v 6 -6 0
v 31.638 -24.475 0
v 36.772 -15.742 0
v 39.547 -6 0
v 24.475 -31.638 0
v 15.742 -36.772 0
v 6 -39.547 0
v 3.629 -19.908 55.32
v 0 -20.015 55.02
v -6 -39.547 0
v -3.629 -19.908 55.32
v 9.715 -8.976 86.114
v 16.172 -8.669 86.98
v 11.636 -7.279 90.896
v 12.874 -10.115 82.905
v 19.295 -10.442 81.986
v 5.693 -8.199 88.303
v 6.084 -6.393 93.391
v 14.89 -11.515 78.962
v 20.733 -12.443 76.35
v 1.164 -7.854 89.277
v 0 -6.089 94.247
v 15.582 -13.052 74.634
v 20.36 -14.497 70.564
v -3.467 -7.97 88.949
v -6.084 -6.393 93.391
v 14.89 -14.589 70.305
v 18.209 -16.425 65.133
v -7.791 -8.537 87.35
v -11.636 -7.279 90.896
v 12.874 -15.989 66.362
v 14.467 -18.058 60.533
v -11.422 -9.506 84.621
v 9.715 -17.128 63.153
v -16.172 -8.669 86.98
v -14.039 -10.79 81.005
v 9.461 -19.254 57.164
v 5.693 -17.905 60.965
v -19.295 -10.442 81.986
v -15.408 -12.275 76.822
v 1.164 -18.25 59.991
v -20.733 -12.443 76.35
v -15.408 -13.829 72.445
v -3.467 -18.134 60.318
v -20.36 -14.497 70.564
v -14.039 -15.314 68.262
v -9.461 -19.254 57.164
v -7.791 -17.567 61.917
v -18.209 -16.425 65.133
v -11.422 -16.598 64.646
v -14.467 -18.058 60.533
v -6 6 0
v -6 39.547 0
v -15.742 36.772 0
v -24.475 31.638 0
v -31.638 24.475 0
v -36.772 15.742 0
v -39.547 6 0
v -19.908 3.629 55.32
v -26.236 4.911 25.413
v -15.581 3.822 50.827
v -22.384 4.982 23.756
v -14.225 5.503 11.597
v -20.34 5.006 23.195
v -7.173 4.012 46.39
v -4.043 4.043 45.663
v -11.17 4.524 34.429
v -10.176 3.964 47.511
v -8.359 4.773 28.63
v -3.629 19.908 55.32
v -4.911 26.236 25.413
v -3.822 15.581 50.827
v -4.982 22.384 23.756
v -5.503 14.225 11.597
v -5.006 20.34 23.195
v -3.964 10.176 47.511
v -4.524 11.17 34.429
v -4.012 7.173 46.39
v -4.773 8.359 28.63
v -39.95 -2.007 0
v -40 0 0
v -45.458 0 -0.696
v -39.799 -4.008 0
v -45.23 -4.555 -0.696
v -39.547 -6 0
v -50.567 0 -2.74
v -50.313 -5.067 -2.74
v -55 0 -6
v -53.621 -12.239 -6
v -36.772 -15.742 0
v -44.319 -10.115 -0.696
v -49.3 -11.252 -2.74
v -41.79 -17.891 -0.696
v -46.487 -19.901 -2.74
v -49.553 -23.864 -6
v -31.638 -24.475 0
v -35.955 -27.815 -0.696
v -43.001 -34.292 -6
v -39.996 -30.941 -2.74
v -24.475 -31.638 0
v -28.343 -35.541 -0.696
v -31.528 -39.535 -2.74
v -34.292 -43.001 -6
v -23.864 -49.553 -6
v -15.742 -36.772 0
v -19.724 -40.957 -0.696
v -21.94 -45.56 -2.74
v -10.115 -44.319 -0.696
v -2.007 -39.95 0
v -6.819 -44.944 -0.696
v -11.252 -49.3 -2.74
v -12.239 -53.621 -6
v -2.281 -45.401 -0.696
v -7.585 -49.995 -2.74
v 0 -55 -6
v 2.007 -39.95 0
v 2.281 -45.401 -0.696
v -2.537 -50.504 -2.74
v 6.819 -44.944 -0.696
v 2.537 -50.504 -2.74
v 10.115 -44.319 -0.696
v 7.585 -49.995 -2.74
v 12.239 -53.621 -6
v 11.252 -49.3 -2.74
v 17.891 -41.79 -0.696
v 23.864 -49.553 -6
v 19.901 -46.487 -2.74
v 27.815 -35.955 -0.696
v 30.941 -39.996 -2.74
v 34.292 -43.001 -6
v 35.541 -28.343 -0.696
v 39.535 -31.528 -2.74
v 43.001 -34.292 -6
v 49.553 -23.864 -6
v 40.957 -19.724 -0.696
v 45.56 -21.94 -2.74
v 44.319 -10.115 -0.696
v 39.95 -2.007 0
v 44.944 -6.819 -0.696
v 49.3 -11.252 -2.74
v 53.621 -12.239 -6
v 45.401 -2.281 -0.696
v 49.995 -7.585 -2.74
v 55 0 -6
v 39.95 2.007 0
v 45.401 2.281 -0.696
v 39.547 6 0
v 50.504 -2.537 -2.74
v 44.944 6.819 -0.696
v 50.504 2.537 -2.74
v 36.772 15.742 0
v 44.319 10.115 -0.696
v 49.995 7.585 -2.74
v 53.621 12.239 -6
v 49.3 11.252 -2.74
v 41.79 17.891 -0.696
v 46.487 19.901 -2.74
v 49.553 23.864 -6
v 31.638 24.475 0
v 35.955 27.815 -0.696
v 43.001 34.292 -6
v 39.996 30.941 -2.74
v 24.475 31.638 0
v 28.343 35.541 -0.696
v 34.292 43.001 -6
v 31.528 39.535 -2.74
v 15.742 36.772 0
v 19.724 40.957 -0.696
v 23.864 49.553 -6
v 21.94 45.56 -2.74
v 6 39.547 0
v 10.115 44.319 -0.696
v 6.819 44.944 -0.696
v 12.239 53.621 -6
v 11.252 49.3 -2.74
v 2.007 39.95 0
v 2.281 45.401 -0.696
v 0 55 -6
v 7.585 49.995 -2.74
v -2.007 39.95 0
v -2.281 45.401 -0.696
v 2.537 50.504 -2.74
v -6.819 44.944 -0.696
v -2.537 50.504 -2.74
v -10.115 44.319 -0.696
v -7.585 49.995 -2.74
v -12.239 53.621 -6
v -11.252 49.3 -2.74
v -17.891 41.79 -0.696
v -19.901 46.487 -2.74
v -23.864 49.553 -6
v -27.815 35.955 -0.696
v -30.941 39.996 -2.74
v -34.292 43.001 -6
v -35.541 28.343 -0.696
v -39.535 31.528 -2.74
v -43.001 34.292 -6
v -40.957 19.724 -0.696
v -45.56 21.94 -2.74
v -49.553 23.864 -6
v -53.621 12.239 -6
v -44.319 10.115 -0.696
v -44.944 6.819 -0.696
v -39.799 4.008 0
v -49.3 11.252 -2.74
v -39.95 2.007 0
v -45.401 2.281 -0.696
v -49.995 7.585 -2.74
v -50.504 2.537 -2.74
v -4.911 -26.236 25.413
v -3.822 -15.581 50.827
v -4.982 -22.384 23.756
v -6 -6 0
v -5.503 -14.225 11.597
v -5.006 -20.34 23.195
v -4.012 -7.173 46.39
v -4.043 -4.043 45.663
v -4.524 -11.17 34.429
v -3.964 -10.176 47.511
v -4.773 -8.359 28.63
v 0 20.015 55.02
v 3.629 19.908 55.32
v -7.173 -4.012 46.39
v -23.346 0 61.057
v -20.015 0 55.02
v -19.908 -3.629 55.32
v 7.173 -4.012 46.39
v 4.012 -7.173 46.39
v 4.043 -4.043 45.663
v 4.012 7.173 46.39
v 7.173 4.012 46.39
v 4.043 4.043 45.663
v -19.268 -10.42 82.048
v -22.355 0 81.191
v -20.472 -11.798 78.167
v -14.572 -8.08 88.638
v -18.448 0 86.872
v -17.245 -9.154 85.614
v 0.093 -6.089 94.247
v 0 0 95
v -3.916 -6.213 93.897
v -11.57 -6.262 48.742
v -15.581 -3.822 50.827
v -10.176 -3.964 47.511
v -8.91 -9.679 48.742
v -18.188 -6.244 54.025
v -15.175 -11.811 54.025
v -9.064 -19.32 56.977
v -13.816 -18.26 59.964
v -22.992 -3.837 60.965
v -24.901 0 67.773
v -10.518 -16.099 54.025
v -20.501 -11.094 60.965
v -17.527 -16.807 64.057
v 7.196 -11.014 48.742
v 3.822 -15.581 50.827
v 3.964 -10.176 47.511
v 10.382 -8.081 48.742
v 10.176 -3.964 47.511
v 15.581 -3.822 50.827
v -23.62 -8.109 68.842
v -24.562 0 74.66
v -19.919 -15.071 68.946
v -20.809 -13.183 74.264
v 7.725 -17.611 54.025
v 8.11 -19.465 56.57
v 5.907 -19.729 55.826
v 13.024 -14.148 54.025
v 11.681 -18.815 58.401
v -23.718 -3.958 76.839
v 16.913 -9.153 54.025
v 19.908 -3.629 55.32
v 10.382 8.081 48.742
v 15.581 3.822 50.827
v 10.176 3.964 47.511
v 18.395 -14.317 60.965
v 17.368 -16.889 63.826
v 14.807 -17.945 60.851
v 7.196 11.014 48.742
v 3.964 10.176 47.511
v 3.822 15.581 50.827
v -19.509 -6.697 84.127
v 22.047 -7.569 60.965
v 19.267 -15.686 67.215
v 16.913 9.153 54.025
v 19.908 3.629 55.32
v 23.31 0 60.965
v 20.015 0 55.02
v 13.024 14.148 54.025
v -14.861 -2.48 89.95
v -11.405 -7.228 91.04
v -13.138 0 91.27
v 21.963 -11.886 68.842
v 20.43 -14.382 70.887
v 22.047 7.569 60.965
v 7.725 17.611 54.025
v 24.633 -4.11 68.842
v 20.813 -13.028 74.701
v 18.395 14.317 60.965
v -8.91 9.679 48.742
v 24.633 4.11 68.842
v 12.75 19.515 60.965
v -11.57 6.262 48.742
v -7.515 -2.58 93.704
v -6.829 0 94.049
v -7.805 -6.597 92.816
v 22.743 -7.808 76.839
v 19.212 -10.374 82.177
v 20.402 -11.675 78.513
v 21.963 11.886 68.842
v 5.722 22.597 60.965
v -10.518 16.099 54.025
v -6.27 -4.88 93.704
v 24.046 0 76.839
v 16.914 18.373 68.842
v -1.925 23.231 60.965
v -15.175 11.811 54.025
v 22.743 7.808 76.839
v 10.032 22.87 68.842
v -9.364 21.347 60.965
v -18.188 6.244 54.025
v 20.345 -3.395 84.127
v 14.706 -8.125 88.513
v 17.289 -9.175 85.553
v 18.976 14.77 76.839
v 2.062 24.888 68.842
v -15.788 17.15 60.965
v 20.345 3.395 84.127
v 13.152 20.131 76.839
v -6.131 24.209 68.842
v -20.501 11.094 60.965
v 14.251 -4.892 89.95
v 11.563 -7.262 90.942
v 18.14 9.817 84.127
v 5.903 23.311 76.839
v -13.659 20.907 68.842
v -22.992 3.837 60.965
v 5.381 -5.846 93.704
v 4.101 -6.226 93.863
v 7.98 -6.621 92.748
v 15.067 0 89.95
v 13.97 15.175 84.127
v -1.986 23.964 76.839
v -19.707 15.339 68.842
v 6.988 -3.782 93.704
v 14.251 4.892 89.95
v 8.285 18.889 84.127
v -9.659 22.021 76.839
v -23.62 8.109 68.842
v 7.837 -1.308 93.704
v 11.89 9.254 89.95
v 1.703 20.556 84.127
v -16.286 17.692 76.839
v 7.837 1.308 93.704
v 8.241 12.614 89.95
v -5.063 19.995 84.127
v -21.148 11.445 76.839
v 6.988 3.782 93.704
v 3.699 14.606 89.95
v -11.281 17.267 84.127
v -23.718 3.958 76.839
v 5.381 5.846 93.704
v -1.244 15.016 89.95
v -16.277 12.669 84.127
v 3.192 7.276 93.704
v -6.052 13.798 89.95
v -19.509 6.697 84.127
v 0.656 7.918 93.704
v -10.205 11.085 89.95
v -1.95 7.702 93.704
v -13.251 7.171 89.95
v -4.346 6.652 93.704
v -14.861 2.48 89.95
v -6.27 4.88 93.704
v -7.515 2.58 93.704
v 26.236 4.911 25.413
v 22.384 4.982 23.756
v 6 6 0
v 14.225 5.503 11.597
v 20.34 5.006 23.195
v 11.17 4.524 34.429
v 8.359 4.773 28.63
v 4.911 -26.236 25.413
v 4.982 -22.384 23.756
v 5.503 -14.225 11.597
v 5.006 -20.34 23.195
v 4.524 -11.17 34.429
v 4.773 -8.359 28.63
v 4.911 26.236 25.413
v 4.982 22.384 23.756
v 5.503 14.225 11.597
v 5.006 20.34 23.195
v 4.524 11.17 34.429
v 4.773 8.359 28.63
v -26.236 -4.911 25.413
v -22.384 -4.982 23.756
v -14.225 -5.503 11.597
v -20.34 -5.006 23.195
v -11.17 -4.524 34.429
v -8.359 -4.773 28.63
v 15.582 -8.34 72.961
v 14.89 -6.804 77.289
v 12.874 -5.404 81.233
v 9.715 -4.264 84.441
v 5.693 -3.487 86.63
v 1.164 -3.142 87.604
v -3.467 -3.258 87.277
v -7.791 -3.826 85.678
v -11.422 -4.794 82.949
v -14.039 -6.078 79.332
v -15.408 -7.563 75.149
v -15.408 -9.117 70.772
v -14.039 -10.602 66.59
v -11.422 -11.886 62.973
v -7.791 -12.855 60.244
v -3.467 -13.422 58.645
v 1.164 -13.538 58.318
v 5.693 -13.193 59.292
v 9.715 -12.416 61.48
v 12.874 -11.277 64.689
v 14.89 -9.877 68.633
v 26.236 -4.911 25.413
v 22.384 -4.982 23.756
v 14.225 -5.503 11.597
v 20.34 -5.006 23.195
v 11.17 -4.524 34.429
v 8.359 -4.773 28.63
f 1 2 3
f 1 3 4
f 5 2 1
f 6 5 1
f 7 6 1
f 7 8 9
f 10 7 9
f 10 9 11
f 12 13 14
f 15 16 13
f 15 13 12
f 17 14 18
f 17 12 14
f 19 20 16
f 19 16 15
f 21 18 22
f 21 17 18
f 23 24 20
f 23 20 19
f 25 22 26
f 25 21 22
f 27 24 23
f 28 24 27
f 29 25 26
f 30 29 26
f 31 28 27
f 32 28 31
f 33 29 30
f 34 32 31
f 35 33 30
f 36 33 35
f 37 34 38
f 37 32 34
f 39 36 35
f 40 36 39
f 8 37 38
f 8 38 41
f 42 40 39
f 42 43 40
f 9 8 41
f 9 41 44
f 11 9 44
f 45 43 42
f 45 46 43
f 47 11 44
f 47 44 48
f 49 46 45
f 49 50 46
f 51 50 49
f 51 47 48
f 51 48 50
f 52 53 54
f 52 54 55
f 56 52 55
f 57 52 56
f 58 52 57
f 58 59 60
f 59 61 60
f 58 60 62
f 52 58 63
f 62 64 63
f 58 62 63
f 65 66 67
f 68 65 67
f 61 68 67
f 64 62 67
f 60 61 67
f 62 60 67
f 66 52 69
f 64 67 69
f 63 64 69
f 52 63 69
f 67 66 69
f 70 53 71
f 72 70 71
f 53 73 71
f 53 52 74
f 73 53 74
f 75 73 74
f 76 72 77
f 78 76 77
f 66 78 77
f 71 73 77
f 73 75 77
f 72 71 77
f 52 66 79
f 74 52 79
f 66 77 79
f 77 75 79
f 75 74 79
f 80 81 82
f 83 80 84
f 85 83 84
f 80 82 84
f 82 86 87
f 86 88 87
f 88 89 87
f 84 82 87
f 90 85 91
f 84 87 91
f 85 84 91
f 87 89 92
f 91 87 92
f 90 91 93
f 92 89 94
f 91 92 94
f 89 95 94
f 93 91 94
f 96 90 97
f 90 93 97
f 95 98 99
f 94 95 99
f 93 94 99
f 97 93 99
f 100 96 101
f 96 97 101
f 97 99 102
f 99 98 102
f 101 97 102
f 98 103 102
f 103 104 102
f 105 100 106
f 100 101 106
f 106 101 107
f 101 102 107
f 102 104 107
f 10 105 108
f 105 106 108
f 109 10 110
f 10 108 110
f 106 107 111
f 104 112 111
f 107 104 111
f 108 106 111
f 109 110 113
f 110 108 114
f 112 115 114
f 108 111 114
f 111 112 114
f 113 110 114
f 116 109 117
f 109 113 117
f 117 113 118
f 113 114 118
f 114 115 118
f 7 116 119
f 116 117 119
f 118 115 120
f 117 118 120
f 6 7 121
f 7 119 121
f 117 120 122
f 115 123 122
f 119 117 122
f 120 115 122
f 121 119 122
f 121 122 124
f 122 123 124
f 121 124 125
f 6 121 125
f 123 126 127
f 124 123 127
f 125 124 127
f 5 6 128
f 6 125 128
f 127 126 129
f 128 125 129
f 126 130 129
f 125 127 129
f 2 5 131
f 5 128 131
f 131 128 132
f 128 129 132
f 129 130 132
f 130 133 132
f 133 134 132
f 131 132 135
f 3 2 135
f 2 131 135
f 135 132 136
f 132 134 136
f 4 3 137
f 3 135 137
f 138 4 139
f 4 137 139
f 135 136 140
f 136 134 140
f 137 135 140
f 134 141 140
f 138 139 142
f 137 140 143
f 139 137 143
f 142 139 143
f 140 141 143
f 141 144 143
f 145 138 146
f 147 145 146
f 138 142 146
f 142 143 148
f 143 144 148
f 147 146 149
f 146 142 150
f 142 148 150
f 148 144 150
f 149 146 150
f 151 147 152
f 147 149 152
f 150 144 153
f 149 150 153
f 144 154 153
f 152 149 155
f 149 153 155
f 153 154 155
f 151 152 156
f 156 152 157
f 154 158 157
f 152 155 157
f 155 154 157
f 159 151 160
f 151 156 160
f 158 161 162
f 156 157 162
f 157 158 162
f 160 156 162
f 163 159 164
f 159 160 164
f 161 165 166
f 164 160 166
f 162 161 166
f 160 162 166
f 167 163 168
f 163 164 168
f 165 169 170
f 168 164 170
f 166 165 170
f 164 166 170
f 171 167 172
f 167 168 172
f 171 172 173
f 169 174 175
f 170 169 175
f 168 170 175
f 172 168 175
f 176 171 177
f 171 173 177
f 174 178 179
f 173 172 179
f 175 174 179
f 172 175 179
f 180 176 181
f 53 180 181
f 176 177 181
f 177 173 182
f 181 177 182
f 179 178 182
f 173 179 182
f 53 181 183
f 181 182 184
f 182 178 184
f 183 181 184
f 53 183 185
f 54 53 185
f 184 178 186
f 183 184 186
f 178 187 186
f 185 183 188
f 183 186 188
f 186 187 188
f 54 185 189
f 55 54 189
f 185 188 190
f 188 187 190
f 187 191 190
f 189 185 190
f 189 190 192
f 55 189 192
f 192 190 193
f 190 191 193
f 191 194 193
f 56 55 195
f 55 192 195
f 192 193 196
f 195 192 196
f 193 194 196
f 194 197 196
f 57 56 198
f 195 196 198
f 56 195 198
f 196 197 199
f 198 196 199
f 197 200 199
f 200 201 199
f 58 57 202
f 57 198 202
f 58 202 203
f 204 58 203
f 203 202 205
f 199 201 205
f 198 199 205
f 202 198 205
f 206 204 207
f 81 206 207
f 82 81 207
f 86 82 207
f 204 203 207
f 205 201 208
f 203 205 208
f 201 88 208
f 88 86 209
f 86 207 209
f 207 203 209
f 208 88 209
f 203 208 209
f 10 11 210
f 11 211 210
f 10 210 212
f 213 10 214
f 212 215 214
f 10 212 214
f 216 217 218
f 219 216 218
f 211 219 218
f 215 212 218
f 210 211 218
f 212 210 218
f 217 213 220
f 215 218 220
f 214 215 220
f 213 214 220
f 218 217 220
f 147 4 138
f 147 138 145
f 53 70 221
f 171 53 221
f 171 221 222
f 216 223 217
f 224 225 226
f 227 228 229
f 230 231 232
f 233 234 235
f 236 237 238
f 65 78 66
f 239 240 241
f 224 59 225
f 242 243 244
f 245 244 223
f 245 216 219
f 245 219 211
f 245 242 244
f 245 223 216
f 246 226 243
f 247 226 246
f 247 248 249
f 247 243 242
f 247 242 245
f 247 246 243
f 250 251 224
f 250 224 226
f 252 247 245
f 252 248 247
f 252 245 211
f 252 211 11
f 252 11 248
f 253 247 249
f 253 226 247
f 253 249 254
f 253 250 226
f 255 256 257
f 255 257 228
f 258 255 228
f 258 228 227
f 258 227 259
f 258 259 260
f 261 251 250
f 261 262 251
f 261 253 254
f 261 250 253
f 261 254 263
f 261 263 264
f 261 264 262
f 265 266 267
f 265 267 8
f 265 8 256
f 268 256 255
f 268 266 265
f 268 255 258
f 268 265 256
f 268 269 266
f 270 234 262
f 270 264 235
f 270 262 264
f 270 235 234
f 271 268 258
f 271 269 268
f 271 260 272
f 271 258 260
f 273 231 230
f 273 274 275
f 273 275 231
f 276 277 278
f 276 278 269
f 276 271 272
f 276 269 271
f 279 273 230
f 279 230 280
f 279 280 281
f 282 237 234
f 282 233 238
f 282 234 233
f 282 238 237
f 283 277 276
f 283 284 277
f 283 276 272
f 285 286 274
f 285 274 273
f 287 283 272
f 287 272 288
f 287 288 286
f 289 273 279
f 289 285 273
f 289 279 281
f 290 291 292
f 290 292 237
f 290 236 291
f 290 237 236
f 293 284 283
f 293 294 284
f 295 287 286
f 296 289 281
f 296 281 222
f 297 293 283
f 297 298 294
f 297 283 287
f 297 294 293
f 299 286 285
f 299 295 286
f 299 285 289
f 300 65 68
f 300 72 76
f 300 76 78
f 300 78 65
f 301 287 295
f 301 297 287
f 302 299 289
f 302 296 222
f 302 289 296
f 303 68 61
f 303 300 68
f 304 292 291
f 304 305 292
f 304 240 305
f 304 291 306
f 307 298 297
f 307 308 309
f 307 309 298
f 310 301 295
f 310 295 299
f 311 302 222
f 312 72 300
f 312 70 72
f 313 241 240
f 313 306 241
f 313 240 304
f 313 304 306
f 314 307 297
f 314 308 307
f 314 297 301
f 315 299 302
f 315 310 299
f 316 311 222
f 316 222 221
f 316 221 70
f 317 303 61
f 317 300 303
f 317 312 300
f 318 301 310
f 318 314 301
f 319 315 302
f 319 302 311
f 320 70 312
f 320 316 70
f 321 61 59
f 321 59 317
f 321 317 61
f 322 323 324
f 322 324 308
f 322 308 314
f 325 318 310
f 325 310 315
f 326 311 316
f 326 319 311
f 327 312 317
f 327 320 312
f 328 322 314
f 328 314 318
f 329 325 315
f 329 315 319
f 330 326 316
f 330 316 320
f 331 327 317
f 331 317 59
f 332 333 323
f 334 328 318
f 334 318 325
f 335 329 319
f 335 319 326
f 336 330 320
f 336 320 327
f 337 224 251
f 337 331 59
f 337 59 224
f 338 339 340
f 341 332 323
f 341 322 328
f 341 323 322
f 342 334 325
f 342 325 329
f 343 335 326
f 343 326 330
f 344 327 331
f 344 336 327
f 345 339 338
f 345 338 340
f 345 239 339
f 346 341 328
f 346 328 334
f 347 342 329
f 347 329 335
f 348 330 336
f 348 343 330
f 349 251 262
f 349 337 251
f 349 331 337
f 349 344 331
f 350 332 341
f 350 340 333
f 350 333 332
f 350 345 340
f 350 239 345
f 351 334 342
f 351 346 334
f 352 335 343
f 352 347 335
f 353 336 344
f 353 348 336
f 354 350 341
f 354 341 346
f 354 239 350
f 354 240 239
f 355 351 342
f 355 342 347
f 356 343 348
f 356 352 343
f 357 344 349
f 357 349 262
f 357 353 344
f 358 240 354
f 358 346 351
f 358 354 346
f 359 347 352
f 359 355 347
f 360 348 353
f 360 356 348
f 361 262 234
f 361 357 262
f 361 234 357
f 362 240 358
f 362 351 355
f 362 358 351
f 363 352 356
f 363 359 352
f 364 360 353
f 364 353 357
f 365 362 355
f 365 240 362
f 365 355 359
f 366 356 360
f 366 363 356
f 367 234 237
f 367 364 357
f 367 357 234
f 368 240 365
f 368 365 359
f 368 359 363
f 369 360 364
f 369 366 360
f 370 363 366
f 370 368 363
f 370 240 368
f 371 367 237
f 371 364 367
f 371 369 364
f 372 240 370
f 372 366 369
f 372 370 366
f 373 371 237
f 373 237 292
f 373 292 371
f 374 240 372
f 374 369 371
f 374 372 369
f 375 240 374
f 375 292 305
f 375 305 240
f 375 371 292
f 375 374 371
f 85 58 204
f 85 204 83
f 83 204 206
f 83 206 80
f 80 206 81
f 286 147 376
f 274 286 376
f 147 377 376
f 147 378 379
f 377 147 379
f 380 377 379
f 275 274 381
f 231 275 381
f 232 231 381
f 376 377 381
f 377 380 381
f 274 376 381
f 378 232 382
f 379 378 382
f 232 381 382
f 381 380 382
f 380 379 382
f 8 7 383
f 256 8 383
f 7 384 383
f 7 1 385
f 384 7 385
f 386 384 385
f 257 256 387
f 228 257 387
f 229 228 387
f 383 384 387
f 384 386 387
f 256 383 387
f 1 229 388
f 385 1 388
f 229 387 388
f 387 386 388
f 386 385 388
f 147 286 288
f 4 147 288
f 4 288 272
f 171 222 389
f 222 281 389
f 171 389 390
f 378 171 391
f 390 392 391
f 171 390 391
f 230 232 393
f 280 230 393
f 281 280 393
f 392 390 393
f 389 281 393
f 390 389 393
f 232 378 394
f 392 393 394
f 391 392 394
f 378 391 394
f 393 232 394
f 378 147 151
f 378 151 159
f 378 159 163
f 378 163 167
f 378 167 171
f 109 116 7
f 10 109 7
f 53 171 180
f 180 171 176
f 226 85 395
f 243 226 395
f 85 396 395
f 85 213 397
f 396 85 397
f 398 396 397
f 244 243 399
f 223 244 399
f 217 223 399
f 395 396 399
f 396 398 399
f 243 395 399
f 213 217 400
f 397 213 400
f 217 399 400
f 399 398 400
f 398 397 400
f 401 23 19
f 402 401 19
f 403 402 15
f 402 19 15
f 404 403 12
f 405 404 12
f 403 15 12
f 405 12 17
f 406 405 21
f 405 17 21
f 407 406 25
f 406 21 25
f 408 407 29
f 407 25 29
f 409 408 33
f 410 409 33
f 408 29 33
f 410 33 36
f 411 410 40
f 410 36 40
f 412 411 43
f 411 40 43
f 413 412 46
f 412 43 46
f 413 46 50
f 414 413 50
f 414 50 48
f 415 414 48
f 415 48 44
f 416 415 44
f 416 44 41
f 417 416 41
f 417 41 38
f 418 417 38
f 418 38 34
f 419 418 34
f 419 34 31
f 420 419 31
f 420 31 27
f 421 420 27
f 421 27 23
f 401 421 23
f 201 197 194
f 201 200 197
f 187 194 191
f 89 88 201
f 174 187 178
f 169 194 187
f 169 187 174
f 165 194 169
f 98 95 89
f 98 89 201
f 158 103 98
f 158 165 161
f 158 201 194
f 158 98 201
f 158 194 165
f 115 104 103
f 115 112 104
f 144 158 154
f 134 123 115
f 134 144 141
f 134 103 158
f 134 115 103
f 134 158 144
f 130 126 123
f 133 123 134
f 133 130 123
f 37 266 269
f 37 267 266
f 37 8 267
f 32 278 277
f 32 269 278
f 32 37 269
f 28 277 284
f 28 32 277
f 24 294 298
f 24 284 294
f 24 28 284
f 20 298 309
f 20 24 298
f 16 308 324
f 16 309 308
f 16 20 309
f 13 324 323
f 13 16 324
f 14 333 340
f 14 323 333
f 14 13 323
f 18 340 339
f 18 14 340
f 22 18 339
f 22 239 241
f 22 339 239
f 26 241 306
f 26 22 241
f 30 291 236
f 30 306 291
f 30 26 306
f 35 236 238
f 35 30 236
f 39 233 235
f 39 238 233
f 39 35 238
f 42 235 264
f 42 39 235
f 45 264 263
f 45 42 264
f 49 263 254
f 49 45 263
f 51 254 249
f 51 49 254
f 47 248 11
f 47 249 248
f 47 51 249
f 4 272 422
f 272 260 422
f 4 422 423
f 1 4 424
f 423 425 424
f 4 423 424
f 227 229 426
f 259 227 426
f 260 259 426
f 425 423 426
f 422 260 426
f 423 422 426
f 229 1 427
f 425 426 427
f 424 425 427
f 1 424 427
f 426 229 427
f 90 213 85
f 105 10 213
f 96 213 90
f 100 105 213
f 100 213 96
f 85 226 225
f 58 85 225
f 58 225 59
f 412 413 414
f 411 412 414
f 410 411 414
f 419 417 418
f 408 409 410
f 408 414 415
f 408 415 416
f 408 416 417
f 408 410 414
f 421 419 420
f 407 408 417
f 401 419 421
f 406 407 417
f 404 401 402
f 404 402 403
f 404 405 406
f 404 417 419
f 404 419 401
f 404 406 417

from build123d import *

# Parameters (mm, degrees)
SKETCH004_R     = 20.812872
POCKET_DEPTH    = 46.345478
SKETCH005_R     = 15.581959
POCKET001_DEPTH = 5


with BuildPart() as part:
    # Sketch001 → Revolution (revolve)
    with BuildSketch(Plane.XZ):
        with BuildLine():
            Line((0, -6), (-40, -6))
            Line((-40, -6), (-55, -6))
            ThreePointArc((-40, 0), (-48.077747, -1.555632), (-55, -6))
            Line((-40, 0), (0, 0))
            Line((0, -6), (0, 0))
        make_face()
    revolve(axis=Axis((0, 0, 0), (0, 0, 1)))

    # Sketch002 (on Face4 of Revolution) → AdditiveLoft section 0
    with BuildSketch(Plane(origin=(0, 0, 0), x_dir=(-1, 0, 0), z_dir=(0, 0, 1))):
        Polygon((-6, 39.54744), (6, 39.54744), (6, 6), (39.54744, 6), (39.54744, -6), (6, -6), (6, -39.54744), (-6, -39.54744), (-6, -6), (-39.54744, -6), (-39.54744, 6), (-6, 6), align=None)
    # Sketch003 (on Face4 of Revolution) → AdditiveLoft section 1
    with BuildSketch(Plane(origin=(0, 0, 70), x_dir=(-1, 0, 0), z_dir=(0, 0, 1))):
        Polygon((-3, 14.696938), (3, 14.696938), (3, 3), (14.696938, 3), (14.696938, -3), (3, -3), (3, -14.696938), (-3, -14.696938), (-3, -3), (-14.696938, -3), (-14.696938, 3), (-3, 3), align=None)
    loft()

    # Sphere → Sphere (revolve)
    with BuildSketch(Plane(origin=(0, 0, 70), x_dir=(-1, 0, 0), z_dir=(0, 1, 0))):
        with BuildLine():
            ThreePointArc((0, -25), (25, 0), (0, 25))
            Line((0, 25), (0, -25))
        make_face()
    revolve(axis=Axis((0, 0, 70), (0, 0, 1)))

    # Sketch004 (on DatumPlane) → Pocket (cut, through all)
    with BuildSketch(Plane(origin=(0, -30.562796, 25.308346), x_dir=(-1, 0, 0), z_dir=(0, -0.942378, 0.334551))):
        with Locations((0, -52.341228)):
            Circle(SKETCH004_R)
    extrude(amount=POCKET_DEPTH, mode=Mode.SUBTRACT)

    # Sketch005 (on Face25 of Pocket) → Pocket001 (cut)
    with BuildSketch(Plane(origin=(0, -13.051994, 74.633552), x_dir=(1, 0, 0), z_dir=(0, -0.942378, 0.334551))):
        Circle(SKETCH005_R)
    extrude(amount=-POCKET001_DEPTH, mode=Mode.SUBTRACT)


solid = part.part
